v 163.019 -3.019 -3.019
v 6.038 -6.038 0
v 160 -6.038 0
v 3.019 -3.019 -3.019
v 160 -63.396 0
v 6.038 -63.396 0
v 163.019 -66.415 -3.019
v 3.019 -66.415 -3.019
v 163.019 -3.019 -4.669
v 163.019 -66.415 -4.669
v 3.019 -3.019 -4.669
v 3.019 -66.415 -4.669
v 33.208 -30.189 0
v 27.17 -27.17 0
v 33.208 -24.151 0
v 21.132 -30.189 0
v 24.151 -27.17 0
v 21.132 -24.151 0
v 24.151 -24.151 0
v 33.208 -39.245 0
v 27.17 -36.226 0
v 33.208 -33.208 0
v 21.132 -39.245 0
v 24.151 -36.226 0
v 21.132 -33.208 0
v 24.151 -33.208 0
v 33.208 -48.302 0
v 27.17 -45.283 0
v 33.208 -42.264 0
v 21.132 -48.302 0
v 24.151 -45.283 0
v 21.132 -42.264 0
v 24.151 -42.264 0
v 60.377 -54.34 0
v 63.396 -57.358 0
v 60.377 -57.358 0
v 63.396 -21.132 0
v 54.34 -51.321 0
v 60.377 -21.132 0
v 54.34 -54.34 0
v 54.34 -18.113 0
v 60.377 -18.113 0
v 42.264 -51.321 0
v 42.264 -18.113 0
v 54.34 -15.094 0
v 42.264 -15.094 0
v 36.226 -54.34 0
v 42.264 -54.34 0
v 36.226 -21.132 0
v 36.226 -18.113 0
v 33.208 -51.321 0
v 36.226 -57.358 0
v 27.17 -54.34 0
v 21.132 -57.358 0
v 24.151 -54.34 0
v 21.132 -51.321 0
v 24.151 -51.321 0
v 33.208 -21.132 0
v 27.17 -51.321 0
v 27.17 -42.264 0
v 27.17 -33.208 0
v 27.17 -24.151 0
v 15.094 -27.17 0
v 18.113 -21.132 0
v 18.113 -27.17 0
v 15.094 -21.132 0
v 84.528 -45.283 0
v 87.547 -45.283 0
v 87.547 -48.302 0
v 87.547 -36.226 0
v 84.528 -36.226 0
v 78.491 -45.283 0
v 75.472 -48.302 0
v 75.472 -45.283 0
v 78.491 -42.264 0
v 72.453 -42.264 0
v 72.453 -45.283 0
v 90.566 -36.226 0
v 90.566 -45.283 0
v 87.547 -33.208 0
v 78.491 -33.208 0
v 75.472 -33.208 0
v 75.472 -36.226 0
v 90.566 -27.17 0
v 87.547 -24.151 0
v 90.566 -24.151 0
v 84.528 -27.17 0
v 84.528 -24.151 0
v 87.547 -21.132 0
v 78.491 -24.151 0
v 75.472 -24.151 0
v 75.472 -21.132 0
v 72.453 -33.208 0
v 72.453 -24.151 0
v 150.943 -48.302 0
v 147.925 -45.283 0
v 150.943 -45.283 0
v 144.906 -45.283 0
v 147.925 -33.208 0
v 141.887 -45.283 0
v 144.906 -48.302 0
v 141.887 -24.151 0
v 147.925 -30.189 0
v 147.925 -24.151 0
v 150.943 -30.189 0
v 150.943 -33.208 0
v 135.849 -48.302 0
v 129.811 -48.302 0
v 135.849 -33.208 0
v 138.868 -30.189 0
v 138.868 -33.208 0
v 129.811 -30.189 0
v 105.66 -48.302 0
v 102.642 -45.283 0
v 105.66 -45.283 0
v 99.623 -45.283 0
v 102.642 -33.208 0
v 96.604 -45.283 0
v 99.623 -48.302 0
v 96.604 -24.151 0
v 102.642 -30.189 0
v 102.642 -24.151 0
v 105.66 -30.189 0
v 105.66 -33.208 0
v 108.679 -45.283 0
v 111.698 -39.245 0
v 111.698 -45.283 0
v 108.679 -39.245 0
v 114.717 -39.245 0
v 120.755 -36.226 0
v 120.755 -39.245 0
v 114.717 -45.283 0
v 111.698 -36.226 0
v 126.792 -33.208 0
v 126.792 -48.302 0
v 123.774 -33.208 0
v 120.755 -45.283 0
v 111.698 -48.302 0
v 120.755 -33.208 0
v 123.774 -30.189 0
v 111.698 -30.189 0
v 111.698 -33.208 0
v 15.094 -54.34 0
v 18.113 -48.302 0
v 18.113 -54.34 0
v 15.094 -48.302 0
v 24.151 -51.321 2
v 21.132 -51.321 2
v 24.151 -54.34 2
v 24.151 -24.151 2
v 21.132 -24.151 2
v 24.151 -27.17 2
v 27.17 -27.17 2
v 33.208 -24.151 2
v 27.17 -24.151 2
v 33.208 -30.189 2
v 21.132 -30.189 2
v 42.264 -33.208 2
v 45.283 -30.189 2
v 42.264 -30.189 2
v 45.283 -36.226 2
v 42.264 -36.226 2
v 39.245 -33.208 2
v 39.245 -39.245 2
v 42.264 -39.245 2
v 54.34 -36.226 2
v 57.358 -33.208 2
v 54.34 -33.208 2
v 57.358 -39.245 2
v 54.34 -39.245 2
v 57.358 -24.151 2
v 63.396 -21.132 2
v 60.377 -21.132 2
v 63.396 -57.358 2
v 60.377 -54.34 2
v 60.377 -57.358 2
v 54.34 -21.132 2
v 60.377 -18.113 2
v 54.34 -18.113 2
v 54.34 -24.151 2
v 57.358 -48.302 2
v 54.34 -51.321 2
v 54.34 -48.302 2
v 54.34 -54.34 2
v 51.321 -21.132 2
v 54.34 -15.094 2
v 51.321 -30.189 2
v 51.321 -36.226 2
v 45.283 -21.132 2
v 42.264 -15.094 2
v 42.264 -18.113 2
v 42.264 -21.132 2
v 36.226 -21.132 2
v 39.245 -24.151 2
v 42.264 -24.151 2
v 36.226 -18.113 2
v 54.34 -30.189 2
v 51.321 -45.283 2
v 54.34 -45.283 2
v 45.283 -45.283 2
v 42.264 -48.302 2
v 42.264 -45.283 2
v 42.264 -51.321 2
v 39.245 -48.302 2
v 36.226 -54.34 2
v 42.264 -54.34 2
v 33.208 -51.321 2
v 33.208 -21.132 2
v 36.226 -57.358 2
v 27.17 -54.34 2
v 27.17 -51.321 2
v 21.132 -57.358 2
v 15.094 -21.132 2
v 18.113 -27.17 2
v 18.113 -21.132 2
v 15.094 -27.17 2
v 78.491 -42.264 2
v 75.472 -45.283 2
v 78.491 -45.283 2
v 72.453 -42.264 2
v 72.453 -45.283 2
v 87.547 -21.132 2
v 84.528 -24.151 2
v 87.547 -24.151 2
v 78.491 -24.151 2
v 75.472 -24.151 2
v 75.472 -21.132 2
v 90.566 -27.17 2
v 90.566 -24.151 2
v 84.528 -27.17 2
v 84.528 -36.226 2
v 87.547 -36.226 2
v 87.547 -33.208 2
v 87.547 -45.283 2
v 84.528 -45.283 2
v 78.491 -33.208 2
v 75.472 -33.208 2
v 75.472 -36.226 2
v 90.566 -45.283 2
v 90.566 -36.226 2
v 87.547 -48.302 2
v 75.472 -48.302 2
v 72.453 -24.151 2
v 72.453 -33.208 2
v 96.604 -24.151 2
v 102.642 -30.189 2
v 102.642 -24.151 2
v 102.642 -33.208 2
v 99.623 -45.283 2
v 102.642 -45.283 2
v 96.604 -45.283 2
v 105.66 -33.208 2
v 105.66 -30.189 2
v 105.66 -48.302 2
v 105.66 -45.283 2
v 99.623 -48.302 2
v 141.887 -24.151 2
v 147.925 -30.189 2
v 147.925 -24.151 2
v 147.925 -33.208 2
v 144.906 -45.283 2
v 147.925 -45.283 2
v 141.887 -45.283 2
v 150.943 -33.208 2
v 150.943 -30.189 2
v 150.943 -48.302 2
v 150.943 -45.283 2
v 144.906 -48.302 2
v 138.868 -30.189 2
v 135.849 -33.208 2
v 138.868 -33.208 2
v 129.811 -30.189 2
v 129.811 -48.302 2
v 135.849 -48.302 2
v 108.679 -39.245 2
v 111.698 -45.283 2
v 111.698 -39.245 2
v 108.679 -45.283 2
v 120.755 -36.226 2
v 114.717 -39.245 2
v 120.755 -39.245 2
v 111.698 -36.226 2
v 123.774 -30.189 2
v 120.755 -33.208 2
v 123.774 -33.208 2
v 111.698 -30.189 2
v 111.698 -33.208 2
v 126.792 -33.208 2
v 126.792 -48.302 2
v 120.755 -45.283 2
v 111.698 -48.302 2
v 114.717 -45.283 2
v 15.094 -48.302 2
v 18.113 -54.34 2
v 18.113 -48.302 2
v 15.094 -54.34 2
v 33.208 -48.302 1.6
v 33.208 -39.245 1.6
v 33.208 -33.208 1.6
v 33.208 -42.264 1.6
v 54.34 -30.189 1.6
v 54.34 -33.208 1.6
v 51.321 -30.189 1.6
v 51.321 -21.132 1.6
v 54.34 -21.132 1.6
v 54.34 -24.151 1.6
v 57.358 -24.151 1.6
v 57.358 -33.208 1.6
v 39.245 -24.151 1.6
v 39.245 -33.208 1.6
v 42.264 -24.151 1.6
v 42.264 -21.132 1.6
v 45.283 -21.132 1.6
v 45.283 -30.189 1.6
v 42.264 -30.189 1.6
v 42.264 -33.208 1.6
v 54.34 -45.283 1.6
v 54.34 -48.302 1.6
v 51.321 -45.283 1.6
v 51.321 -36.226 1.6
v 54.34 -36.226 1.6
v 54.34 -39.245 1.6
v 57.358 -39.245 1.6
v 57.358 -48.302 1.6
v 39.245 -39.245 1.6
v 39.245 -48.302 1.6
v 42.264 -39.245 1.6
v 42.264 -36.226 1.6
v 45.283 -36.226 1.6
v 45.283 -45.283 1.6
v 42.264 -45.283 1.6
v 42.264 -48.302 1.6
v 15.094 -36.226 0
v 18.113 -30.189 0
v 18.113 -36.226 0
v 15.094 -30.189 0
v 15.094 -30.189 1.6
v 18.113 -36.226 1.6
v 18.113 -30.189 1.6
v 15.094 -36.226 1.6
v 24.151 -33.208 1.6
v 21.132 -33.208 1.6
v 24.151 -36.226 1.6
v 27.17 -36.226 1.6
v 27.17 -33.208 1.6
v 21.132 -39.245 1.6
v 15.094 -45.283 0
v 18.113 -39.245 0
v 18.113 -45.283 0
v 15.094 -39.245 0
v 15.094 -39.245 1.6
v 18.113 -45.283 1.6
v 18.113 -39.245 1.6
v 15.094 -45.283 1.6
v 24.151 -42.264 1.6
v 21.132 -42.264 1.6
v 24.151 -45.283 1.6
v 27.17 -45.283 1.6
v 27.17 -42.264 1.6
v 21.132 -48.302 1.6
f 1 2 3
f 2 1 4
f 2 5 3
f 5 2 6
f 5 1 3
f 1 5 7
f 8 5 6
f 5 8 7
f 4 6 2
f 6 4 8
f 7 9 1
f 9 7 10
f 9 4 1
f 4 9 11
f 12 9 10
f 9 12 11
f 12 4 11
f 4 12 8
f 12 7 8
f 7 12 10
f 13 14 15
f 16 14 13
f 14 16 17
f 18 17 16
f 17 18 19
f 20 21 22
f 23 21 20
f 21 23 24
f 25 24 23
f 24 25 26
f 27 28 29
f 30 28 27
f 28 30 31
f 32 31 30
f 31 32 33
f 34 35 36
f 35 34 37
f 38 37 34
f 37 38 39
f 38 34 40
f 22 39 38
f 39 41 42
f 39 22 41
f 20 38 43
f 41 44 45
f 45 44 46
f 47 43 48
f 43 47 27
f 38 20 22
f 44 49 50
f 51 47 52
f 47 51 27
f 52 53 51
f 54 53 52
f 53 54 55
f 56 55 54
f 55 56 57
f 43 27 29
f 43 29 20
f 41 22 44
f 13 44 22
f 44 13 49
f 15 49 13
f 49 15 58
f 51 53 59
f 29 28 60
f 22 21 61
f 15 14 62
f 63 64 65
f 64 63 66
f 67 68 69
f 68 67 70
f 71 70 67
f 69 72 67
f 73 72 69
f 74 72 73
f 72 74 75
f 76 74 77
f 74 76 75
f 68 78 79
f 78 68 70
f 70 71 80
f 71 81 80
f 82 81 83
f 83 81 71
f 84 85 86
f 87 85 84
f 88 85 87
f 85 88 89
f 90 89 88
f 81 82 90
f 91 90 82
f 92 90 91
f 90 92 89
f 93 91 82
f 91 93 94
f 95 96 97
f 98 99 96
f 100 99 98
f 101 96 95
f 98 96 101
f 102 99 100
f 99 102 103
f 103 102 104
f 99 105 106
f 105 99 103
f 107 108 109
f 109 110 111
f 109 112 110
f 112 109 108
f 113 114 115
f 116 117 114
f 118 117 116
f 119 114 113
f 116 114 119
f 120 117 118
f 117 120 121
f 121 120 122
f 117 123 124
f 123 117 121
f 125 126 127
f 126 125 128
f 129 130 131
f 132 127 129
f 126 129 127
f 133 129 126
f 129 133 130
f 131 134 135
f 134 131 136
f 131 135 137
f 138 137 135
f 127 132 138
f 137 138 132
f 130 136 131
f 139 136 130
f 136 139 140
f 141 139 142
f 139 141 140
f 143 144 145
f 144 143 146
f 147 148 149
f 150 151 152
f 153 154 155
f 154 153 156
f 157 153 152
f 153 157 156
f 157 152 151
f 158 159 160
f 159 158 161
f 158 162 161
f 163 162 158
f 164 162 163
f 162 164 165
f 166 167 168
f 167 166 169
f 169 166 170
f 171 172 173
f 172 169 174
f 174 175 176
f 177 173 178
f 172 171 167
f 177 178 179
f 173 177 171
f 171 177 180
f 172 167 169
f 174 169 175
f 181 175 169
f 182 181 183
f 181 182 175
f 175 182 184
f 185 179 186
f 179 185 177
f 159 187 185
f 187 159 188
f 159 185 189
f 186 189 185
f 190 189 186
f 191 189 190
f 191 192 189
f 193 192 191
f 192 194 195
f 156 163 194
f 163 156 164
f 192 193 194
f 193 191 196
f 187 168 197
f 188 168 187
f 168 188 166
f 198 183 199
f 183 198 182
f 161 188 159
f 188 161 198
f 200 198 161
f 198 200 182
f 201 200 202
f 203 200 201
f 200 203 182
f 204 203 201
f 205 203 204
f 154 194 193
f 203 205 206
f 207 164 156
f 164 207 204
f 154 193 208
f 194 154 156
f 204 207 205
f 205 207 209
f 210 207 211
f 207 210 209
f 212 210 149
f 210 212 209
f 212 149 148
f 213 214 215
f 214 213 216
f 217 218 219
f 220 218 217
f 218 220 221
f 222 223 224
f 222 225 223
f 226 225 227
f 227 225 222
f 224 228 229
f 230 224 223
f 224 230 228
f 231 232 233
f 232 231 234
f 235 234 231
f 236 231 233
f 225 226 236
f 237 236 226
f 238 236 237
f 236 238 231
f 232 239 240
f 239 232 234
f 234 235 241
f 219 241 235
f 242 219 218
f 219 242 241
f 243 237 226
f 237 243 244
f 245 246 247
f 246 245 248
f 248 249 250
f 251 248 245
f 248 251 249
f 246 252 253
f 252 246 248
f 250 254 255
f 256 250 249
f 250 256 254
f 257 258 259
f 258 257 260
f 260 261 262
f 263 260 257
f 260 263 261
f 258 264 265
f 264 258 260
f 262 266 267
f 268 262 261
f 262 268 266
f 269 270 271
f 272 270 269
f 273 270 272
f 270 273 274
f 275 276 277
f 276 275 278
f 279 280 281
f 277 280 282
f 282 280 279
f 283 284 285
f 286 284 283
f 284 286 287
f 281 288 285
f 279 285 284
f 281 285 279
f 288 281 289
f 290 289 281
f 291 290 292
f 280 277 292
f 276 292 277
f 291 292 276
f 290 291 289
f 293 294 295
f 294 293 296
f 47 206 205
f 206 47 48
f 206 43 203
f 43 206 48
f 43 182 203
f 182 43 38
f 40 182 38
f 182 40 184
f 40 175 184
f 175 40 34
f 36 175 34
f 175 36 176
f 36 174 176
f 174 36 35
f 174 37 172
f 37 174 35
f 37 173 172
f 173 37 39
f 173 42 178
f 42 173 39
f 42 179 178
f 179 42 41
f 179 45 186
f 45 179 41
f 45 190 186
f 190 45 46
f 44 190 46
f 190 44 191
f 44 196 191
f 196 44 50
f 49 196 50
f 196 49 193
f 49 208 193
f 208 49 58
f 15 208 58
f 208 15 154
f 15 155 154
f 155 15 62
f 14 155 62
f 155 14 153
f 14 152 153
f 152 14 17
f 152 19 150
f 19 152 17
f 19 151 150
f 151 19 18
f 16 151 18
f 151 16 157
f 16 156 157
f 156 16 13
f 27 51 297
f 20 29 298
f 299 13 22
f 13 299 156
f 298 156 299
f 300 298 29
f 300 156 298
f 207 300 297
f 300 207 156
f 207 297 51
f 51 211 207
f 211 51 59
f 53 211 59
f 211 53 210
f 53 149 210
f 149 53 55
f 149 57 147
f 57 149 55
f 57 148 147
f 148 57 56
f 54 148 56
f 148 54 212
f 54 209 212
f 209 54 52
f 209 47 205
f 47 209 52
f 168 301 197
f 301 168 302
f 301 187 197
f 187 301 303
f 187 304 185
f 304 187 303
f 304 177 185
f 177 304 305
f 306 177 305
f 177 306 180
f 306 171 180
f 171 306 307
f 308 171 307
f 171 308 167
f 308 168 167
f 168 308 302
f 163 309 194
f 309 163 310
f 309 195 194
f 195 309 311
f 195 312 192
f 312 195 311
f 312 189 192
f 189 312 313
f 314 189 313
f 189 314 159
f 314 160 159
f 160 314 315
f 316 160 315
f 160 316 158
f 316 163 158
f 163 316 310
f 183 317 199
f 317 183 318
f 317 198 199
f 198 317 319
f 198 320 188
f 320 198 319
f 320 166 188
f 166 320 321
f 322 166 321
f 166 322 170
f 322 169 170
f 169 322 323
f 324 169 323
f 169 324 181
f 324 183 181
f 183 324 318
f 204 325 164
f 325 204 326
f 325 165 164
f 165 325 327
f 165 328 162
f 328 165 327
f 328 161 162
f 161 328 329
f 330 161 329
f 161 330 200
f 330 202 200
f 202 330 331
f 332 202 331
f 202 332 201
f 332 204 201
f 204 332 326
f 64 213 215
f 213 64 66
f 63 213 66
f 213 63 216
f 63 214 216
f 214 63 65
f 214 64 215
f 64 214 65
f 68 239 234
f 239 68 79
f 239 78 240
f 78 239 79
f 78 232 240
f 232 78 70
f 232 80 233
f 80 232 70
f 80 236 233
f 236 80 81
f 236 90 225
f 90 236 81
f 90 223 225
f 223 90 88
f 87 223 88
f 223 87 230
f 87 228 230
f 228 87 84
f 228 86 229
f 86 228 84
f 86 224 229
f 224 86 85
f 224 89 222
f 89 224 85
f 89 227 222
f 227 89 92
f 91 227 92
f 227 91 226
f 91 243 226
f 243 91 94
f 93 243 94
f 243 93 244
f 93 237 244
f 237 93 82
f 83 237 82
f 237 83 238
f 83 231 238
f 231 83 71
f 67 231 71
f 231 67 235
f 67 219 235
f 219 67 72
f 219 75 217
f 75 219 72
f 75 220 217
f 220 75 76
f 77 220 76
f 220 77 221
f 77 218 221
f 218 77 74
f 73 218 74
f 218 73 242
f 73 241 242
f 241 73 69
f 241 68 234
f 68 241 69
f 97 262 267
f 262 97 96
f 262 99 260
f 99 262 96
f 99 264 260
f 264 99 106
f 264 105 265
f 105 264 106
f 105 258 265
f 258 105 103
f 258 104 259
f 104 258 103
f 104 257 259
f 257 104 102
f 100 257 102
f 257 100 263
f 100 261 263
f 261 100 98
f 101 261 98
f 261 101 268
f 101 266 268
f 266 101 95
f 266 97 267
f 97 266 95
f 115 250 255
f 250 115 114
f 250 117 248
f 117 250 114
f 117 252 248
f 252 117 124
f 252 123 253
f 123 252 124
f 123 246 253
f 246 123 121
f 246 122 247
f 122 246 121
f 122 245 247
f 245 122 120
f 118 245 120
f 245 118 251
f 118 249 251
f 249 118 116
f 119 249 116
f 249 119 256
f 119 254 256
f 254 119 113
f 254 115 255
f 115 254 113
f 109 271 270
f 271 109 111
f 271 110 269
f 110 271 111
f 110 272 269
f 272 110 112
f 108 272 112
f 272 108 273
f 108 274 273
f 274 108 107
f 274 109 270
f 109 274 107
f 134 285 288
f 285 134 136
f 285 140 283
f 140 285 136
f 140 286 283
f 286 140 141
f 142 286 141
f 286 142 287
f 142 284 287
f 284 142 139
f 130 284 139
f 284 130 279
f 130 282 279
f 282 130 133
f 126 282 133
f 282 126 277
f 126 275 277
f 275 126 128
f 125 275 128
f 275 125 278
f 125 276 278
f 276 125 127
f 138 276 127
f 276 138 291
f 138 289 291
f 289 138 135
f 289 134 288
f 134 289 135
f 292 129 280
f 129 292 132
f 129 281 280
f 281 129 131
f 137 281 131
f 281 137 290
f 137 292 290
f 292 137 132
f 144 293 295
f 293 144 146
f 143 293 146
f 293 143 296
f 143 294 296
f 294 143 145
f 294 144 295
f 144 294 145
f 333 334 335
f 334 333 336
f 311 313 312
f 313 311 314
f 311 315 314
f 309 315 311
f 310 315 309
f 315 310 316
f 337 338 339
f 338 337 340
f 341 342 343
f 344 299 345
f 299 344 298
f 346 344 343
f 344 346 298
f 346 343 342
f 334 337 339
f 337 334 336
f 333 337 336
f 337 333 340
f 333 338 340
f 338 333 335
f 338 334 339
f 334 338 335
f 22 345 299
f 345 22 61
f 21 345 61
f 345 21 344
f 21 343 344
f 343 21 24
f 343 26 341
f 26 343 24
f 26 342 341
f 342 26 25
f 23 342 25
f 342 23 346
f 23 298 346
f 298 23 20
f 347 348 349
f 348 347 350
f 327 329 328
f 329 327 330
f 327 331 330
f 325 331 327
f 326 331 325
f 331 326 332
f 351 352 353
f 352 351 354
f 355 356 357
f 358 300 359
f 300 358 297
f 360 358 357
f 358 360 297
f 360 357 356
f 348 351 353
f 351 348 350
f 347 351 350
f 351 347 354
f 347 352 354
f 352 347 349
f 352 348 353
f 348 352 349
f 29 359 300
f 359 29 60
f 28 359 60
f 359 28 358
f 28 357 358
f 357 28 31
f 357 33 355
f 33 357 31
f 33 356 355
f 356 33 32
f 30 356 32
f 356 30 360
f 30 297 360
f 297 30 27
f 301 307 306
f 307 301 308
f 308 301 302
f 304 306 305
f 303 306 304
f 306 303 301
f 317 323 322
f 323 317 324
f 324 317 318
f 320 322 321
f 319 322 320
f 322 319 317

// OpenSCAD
// the final width of the button
final_width_mm = 160;

// setting the black thickness lets you use layers of black filament
// to do the black coloring, while leaving the base and colored parts
// of the logo a different color

// the thickness of the rectangular base
base_thickness_mm = 8.0;
// how far the colored parts of the logo stick out beyond the base
logo_thickness_mm = 1.6;
// how far the black parts of the logo stick out beyond the base
black_thickness_mm = 2.0; 


// You shouldn't need to adjust anything below this line

scale_factor = final_width_mm / 53;


// I read all the coordinates off a bitmap, so the coordinate system
// is left handed. Everything needs to get flipped over.


// Defining these here because it's easier to do polygons with holes this way
logo_outline = [
    [7,8],[8,8],[8,9],[9,9],[9,8],[11,8],[11,7],[12,7],
    [12,6],[14,6],[14,5],[18,5],[18,6],[20,6],[20,7],[21,7],
    [21,10],[21,19],[20,19],[20,18],[18,18],[18,17],[14,17],[14,18],[12,18],
    [12,19],[7,19],[7,17],[8,17],[8,18],[9,18],[9,17],[11,17],
    [11,10],[7,10],[7,8]
];
logo_outline_path = [for (i = [0:len(logo_outline)]) i];
logo_hole_0 = [
    [13,8],[14,8],[14,7],[15,7],[15,10],[14,10],[14,11],[13,11],[13,8]
];
logo_hole_0_path = [for (i = [0:len(logo_hole_0)]) i + len(logo_outline_path) - 1];
logo_hole_1 = [
    [17,7],[18,7],[18,8],[19,8],[19,11],[18,11],[18,10],[17,10],[17,7]
];
logo_hole_1_path = [for (i = [0:len(logo_hole_1)]) i + len(logo_outline_path) + len(logo_hole_0) - 1];
logo_hole_2 = [
    [17,12],[18,12],[18,13],[19,13],[19,16],[18,16],[18,15],[17,15],[17,12]
];
logo_hole_2_path = [for (i = [0:len(logo_hole_2)]) i + len(logo_outline_path) + len(logo_hole_0) + len(logo_hole_1) - 1];
logo_hole_3 = [
    [13,13],[14,13],[14,12],[15,12],[15,15],[14,15],[14,16],[13,16],[13,13]
];
logo_hole_3_path = [for (i = [0:len(logo_hole_2)]) i + len(logo_outline_path) + len(logo_hole_0) + len(logo_hole_1) + len(logo_hole_2) - 1];
    
a_outline = [
    [37,10],[41,10],[41,11],[42,11],[42,16],[37,16],[37,15],[36,15],
    [36,13],[37,13],[37,12],[40,12],[40,11],[37,11],[37,10]
];
a_outline_path = [for (i = [0:len(a_outline)]) i];
a_hole = [
    [38,13],[40,13],[40,15],[38,15],[38,13]
];
a_hole_path = [for (i = [0:len(a_hole)]) i + len(a_outline_path) - 1];


// the portions of the logo that are black
color("#000000")
linear_extrude(black_thickness_mm)
scale([scale_factor, scale_factor, 1])
rotate([180,0,0])
union() {
    polygon([ // upper trail
        [5,7],[6,7],[6,9],[5,9]
    ]); 
    polygon([ // lower trail
        [5,16],[6,16],[6,18],[5,18]
    ]);
    polygon( // main windows logo
        concat(logo_outline, logo_hole_0, logo_hole_1, logo_hole_2, logo_hole_3),
        [logo_outline_path,
         logo_hole_0_path, logo_hole_1_path,
         logo_hole_2_path, logo_hole_3_path,
        ]
    );
    polygon([ // letter S
        [25,7],[29,7],[29,8],[30,8],[30,9],[28,9],[28,8],[26,8],
        [26,11],[29,11],[29,12],[30,12],[30,15],[29,15],[29,16],[25,16],
        [25,15],[24,15],[24,14],[26,14],[26,15],[28,15],[28,12],[25,12],
        [25,11],[24,11],[24,8],[25,8]
    ]);
    polygon([ // letter t
        [32,8],[34,8],[34,10],[35,10],[35,11],[34,11],[34,15],[35,15],
        [35,16],[33,16],[33,15],[32,15]
    ]);
    polygon( // letter a
        concat(a_outline, a_hole),
        [a_outline_path, a_hole_path]
    );
    polygon([ // letter r
        [43,10],[46,10],[46,11],[45,11],[45,16],[43,16]
    ]);
    polygon([ // letter t
        [47,8],[49,8],[49,10],[50,10],[50,11],[49,11],[49,15],[50,15],
        [50,16],[48,16],[48,15],[47,15]
    ]);
};

// the red part of the logo
color("#fc0d1b")
linear_extrude(logo_thickness_mm)
scale([scale_factor, scale_factor, 1])
rotate([180,0,0])
union() {
    polygon(logo_hole_0);
    polygon([ // middle upper trail
        [5,10],[6,10],[6,12],[5,12]
    ]);
    polygon([ // middle upper logo
        [7,11],[8,11],[8,12],[9,12],[9,11],[11,11],[11,13],[7,13]
    ]);
};
    
// the blue part of the logo
color("#0b24fb")
linear_extrude(logo_thickness_mm)
scale([scale_factor, scale_factor, 1])
rotate([180,0,0])
union() {
    polygon(logo_hole_3);
    polygon([ // middle lower trail
        [5,13],[6,13],[6,15],[5,15]
    ]);
    polygon([ // middle lower logo
        [7,14],[8,14],[8,15],[9,15],[9,14],[11,14],[11,16],[7,16]
    ]);
};

// the green part of the logo
color("#29fd2f")
linear_extrude(logo_thickness_mm)
scale([scale_factor, scale_factor, 1])
rotate([180,0,0])
polygon(logo_hole_1);

// the yellow part of the logo
color("#fffd38")
linear_extrude(logo_thickness_mm)
scale([scale_factor, scale_factor, 1])
rotate([180,0,0])
polygon(logo_hole_2);

// the base
unbeveled_thickness = base_thickness_mm/scale_factor - 1;
assert(unbeveled_thickness >= 0, "base isn't thick enough for bevel");
color("#c3c3c3")
translate([0,0,-scale_factor])
rotate([180,0,0])
union() {
    scale([scale_factor, scale_factor, scale_factor])
    polyhedron([
        [1,1,0],[54,1,0],[54,22,0],[1,22,0],
        [2,2,-1],[53,2,-1],[53,21,-1],[2,21,-1]
    ],[
        [0,1,2,3],[4,5,1,0],[7,6,5,4],
        [5,6,2,1],[6,7,3,2],[7,4,0,3]
    ]);
    scale([scale_factor, scale_factor, 1])
    linear_extrude(unbeveled_thickness)
    polygon([[1,1],[54,1],[54,22],[1,22]]);
}
